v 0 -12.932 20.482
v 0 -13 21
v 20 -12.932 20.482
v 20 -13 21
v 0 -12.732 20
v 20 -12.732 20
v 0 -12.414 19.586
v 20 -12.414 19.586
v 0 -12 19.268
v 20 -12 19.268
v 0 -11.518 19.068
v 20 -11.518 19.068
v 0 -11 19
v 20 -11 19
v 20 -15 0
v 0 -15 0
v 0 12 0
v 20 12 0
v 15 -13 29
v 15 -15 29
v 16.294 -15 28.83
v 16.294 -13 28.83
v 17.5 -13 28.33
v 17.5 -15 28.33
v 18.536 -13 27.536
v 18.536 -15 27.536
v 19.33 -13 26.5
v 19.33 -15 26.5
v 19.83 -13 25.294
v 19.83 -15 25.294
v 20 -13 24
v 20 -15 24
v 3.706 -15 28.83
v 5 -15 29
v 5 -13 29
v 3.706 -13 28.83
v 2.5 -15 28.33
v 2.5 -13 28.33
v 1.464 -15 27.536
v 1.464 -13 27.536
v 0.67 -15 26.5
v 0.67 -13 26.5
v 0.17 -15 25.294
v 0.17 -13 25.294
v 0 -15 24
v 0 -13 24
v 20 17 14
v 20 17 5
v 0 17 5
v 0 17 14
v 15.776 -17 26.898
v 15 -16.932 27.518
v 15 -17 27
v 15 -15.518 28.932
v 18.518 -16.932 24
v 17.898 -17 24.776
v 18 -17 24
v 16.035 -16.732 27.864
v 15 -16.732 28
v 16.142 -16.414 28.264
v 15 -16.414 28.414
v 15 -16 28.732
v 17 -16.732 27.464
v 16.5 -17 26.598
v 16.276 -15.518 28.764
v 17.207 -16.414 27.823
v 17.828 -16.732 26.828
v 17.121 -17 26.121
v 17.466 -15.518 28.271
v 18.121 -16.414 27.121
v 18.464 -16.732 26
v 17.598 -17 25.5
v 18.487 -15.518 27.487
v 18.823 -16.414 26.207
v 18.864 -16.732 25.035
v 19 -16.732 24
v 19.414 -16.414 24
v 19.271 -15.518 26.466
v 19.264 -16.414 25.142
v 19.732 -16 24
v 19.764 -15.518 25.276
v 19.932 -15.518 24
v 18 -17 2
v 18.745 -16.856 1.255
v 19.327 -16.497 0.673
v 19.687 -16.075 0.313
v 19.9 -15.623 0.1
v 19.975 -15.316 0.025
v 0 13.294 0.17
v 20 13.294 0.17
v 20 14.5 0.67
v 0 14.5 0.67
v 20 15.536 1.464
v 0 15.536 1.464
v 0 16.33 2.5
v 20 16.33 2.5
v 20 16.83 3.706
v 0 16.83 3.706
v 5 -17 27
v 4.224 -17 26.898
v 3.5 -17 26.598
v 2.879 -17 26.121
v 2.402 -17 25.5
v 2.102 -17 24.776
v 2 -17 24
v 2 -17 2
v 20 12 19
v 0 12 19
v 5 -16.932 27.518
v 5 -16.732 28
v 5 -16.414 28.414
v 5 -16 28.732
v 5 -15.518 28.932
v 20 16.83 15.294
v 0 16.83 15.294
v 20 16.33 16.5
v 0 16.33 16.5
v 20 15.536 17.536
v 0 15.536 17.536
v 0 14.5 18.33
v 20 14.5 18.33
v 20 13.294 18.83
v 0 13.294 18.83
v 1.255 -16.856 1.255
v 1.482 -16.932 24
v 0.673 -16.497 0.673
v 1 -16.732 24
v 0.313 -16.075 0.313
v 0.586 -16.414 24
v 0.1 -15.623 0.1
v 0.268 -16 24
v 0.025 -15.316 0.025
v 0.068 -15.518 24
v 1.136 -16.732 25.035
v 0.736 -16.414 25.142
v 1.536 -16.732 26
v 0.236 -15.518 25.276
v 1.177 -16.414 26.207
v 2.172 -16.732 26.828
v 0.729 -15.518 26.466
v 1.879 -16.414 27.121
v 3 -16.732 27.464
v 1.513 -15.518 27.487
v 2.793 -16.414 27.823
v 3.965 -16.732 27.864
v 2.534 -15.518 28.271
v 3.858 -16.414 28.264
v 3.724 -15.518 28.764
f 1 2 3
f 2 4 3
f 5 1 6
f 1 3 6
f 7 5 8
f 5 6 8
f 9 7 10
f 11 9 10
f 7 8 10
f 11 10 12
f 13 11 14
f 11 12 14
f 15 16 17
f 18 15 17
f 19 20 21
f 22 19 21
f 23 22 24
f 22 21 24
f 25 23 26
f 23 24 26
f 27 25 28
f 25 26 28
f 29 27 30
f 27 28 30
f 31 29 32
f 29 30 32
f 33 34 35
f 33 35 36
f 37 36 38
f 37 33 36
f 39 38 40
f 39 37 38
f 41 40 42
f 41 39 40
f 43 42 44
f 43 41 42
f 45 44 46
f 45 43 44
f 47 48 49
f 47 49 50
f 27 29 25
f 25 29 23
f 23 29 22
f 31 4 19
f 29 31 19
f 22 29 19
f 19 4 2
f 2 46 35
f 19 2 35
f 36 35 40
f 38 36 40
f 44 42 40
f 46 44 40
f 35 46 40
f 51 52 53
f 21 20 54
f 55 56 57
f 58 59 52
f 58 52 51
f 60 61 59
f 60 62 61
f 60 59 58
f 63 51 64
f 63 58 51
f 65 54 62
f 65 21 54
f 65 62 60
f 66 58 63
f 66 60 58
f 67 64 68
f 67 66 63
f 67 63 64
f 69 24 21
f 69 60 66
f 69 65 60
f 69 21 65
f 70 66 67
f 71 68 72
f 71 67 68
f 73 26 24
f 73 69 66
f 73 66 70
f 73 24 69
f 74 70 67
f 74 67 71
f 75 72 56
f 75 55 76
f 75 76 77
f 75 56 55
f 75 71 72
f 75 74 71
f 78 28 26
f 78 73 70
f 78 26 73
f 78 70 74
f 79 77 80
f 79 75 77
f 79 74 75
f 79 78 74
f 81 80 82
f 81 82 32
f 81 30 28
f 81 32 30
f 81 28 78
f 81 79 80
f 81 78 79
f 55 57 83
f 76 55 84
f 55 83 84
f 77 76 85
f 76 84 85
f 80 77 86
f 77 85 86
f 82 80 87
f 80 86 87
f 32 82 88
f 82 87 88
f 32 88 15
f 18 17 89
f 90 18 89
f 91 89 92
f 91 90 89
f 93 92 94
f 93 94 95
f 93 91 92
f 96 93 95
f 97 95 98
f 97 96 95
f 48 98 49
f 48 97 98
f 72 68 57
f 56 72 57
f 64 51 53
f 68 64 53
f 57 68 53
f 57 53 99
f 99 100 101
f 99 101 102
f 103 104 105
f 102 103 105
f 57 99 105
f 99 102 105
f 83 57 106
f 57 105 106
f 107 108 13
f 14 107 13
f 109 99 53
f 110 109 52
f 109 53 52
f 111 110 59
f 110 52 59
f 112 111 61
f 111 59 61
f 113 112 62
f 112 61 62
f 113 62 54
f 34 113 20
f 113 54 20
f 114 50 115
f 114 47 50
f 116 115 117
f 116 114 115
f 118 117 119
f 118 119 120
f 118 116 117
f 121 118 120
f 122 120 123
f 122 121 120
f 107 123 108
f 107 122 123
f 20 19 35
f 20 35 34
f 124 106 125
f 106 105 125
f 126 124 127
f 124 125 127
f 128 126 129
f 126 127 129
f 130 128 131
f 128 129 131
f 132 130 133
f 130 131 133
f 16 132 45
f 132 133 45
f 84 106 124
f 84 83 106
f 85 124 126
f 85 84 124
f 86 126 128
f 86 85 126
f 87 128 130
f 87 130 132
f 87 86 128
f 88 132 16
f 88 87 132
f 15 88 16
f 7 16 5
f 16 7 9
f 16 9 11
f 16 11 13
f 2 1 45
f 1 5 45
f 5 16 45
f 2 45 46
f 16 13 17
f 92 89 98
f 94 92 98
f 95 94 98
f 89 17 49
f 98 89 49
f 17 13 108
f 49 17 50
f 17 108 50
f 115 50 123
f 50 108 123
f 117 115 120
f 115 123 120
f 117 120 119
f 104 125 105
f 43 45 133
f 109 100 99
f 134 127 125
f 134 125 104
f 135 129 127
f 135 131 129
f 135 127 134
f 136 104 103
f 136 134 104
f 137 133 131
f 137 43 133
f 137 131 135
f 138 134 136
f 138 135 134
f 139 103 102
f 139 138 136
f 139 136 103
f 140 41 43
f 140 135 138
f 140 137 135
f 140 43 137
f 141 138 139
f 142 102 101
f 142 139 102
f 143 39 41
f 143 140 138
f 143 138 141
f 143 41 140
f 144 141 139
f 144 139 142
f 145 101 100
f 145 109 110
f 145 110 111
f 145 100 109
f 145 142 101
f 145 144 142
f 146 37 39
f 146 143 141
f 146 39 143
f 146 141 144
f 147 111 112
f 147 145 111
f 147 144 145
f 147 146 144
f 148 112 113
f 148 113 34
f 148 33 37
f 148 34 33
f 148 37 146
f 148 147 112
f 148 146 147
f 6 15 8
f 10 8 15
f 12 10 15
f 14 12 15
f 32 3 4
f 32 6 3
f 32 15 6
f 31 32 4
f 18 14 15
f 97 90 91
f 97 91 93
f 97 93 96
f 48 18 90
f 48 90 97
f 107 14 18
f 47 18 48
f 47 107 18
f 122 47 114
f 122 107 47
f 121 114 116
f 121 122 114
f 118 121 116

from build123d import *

# Parameters (mm, degrees)
F1_DEPTH = 20
F2_R     = 5
F3_R     = 2


with BuildPart() as f1:
    # F0 (on Right) → F1 (new body)
    with BuildSketch(Plane.YZ):
        Polygon((-17, 29), (-17, 0), (17, 0), (17, 19), (-13, 19), (-13, 29), align=None)
    extrude(amount=F1_DEPTH)

    # F2
    f2_edges = [f1.edges().sort_by_distance(p)[0] for p in [
        (20, -15, 29),
        (0, -15, 29),
        (10, 17, 19),
        (10, 17, 0),
    ]]
    fillet(f2_edges, radius=F2_R)

    # F3
    f3_edges = [f1.edges().sort_by_distance(p)[0] for p in [
        (10, -17, 0),
        (10, -17, 29),
        (10, -13, 19),
    ]]
    fillet(f3_edges, radius=F3_R)


solid = f1.part
